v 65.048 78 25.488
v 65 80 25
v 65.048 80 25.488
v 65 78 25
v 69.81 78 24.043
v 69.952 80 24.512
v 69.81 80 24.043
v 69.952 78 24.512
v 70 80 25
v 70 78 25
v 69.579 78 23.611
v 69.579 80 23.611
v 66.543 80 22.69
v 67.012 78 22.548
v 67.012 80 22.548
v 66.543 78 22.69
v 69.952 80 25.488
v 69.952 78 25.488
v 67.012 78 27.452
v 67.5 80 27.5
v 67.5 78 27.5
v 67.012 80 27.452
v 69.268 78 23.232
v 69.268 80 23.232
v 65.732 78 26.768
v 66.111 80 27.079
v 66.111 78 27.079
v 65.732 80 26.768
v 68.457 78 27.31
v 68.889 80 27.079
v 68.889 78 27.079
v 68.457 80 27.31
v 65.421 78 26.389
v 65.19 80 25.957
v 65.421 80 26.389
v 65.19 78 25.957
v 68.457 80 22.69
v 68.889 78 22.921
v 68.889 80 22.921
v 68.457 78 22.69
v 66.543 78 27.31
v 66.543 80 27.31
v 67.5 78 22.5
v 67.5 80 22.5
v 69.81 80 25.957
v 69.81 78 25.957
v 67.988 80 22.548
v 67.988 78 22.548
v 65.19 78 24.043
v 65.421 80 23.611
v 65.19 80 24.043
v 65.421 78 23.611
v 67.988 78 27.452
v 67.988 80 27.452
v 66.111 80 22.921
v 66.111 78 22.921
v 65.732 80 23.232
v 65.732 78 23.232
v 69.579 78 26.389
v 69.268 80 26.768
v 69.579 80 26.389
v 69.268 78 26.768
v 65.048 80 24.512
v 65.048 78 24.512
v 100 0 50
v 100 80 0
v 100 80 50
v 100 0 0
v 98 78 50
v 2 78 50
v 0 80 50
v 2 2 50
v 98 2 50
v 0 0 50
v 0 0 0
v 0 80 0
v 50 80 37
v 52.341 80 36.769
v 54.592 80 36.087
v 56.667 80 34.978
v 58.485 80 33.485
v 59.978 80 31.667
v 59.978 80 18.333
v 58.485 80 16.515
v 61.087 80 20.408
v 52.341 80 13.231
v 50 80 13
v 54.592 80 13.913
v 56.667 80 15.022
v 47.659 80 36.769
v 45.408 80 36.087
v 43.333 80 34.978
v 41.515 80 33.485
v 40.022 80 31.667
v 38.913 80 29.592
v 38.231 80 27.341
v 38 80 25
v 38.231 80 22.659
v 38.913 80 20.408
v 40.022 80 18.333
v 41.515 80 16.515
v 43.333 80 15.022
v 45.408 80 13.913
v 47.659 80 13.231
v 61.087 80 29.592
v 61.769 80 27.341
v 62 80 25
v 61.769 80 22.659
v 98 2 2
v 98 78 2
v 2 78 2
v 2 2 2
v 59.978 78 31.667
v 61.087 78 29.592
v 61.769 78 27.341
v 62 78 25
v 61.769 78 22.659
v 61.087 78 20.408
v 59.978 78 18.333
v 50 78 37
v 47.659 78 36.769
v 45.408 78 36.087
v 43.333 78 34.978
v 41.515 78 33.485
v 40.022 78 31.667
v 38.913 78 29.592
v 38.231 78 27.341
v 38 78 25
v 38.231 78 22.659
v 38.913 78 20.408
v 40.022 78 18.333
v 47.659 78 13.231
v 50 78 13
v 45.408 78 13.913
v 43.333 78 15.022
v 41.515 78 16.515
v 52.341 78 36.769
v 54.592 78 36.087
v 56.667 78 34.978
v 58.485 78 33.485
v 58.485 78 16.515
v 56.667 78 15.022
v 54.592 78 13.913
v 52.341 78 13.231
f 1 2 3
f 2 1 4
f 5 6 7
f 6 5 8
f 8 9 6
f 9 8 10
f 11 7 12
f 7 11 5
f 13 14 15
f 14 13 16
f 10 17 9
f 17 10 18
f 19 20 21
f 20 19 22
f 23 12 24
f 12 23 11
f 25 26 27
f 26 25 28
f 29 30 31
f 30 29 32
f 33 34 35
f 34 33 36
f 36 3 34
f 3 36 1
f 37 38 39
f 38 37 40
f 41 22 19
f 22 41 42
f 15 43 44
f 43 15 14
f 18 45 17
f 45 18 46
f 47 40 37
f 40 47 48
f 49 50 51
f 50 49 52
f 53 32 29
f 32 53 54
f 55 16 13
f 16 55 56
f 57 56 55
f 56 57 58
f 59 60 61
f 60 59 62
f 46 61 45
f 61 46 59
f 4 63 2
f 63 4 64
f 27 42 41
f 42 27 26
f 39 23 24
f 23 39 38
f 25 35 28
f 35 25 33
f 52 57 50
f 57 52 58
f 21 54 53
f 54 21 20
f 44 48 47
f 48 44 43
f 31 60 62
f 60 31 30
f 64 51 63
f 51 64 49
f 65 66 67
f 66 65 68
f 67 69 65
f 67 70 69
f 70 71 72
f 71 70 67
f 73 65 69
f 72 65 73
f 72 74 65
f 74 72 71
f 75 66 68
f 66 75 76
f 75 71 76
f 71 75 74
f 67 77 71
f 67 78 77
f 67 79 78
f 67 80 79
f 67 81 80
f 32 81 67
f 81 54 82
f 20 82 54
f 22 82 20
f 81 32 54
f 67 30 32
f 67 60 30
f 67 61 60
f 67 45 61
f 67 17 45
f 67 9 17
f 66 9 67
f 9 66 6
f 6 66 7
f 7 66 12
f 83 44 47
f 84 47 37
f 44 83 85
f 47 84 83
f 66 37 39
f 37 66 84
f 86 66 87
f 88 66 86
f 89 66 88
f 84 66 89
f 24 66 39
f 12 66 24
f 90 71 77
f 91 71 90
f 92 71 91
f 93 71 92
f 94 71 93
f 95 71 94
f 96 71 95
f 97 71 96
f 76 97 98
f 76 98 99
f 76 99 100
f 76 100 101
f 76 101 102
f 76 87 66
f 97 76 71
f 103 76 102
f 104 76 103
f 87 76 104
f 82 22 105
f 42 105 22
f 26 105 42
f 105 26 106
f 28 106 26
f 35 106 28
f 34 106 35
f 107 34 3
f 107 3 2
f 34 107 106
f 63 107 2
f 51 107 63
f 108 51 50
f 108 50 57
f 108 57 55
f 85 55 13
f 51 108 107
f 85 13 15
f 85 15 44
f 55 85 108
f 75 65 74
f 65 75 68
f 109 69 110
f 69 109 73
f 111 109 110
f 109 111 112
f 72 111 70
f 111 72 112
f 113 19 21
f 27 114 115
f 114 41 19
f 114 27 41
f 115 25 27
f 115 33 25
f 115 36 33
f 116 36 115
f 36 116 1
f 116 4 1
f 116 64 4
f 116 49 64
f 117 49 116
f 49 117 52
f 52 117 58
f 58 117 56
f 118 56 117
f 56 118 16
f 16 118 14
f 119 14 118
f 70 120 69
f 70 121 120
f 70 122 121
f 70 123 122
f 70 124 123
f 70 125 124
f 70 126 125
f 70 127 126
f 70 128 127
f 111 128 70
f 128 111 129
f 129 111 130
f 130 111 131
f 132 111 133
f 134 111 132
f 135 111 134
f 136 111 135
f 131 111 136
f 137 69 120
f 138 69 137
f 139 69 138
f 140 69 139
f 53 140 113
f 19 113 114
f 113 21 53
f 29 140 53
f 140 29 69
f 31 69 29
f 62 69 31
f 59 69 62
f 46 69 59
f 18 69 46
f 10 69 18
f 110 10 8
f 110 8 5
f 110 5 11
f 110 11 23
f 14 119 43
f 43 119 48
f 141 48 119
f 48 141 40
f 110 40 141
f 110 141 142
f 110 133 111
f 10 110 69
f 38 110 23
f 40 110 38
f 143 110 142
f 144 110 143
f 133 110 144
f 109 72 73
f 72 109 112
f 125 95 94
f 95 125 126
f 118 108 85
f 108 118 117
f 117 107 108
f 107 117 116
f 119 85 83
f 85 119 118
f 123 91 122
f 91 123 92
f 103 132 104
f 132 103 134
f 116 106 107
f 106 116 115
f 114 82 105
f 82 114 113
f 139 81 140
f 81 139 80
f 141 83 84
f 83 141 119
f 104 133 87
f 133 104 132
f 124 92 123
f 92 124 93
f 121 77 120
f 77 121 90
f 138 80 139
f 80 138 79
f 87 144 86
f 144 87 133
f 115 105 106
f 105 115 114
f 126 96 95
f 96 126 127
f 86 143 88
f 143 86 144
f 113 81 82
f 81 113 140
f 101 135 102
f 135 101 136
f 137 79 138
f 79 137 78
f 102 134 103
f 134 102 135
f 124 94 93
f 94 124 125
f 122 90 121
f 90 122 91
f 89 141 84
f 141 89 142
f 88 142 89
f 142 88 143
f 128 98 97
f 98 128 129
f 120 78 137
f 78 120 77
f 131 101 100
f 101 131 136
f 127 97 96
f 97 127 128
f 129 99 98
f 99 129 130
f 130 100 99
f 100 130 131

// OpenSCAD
$fn = 32;

// ----------------------------------------------------------------------
// Vent box: roundvent enclosure
// ----------------------------------------------------------------------

// --- parameters (mm) ---
box_l = 100;              // box length, X
box_w = 80;               // box width, Y
box_h = 50;               // box height, Z
wall_t = 2;               // shell wall thickness
vent_d = 24;              // central vent diameter
ring_d = 5;               // ring hole diameter
n_ring = 8;               // holes in the ring
ring_r = 17.5;            // ring radius

ring_step = 360 / n_ring;  // ring hole angular step

difference() {
  cube([box_l, box_w, box_h]);
  translate([wall_t, wall_t, wall_t])
    cube([box_l - 2 * wall_t, box_w - 2 * wall_t, box_h]);
  translate([box_l / 2, box_w - wall_t - 1, box_h / 2])
    rotate([-90, 0, 0]) cylinder(h = wall_t + 2, d = vent_d);
  for (i = [0 : n_ring - 1])
    translate([box_l / 2, box_w - wall_t - 1, box_h / 2])
      rotate([0, 0, i * ring_step])
        translate([ring_r, 0, 0]) rotate([-90, 0, 0])
          cylinder(h = wall_t + 2, d = ring_d);
}
